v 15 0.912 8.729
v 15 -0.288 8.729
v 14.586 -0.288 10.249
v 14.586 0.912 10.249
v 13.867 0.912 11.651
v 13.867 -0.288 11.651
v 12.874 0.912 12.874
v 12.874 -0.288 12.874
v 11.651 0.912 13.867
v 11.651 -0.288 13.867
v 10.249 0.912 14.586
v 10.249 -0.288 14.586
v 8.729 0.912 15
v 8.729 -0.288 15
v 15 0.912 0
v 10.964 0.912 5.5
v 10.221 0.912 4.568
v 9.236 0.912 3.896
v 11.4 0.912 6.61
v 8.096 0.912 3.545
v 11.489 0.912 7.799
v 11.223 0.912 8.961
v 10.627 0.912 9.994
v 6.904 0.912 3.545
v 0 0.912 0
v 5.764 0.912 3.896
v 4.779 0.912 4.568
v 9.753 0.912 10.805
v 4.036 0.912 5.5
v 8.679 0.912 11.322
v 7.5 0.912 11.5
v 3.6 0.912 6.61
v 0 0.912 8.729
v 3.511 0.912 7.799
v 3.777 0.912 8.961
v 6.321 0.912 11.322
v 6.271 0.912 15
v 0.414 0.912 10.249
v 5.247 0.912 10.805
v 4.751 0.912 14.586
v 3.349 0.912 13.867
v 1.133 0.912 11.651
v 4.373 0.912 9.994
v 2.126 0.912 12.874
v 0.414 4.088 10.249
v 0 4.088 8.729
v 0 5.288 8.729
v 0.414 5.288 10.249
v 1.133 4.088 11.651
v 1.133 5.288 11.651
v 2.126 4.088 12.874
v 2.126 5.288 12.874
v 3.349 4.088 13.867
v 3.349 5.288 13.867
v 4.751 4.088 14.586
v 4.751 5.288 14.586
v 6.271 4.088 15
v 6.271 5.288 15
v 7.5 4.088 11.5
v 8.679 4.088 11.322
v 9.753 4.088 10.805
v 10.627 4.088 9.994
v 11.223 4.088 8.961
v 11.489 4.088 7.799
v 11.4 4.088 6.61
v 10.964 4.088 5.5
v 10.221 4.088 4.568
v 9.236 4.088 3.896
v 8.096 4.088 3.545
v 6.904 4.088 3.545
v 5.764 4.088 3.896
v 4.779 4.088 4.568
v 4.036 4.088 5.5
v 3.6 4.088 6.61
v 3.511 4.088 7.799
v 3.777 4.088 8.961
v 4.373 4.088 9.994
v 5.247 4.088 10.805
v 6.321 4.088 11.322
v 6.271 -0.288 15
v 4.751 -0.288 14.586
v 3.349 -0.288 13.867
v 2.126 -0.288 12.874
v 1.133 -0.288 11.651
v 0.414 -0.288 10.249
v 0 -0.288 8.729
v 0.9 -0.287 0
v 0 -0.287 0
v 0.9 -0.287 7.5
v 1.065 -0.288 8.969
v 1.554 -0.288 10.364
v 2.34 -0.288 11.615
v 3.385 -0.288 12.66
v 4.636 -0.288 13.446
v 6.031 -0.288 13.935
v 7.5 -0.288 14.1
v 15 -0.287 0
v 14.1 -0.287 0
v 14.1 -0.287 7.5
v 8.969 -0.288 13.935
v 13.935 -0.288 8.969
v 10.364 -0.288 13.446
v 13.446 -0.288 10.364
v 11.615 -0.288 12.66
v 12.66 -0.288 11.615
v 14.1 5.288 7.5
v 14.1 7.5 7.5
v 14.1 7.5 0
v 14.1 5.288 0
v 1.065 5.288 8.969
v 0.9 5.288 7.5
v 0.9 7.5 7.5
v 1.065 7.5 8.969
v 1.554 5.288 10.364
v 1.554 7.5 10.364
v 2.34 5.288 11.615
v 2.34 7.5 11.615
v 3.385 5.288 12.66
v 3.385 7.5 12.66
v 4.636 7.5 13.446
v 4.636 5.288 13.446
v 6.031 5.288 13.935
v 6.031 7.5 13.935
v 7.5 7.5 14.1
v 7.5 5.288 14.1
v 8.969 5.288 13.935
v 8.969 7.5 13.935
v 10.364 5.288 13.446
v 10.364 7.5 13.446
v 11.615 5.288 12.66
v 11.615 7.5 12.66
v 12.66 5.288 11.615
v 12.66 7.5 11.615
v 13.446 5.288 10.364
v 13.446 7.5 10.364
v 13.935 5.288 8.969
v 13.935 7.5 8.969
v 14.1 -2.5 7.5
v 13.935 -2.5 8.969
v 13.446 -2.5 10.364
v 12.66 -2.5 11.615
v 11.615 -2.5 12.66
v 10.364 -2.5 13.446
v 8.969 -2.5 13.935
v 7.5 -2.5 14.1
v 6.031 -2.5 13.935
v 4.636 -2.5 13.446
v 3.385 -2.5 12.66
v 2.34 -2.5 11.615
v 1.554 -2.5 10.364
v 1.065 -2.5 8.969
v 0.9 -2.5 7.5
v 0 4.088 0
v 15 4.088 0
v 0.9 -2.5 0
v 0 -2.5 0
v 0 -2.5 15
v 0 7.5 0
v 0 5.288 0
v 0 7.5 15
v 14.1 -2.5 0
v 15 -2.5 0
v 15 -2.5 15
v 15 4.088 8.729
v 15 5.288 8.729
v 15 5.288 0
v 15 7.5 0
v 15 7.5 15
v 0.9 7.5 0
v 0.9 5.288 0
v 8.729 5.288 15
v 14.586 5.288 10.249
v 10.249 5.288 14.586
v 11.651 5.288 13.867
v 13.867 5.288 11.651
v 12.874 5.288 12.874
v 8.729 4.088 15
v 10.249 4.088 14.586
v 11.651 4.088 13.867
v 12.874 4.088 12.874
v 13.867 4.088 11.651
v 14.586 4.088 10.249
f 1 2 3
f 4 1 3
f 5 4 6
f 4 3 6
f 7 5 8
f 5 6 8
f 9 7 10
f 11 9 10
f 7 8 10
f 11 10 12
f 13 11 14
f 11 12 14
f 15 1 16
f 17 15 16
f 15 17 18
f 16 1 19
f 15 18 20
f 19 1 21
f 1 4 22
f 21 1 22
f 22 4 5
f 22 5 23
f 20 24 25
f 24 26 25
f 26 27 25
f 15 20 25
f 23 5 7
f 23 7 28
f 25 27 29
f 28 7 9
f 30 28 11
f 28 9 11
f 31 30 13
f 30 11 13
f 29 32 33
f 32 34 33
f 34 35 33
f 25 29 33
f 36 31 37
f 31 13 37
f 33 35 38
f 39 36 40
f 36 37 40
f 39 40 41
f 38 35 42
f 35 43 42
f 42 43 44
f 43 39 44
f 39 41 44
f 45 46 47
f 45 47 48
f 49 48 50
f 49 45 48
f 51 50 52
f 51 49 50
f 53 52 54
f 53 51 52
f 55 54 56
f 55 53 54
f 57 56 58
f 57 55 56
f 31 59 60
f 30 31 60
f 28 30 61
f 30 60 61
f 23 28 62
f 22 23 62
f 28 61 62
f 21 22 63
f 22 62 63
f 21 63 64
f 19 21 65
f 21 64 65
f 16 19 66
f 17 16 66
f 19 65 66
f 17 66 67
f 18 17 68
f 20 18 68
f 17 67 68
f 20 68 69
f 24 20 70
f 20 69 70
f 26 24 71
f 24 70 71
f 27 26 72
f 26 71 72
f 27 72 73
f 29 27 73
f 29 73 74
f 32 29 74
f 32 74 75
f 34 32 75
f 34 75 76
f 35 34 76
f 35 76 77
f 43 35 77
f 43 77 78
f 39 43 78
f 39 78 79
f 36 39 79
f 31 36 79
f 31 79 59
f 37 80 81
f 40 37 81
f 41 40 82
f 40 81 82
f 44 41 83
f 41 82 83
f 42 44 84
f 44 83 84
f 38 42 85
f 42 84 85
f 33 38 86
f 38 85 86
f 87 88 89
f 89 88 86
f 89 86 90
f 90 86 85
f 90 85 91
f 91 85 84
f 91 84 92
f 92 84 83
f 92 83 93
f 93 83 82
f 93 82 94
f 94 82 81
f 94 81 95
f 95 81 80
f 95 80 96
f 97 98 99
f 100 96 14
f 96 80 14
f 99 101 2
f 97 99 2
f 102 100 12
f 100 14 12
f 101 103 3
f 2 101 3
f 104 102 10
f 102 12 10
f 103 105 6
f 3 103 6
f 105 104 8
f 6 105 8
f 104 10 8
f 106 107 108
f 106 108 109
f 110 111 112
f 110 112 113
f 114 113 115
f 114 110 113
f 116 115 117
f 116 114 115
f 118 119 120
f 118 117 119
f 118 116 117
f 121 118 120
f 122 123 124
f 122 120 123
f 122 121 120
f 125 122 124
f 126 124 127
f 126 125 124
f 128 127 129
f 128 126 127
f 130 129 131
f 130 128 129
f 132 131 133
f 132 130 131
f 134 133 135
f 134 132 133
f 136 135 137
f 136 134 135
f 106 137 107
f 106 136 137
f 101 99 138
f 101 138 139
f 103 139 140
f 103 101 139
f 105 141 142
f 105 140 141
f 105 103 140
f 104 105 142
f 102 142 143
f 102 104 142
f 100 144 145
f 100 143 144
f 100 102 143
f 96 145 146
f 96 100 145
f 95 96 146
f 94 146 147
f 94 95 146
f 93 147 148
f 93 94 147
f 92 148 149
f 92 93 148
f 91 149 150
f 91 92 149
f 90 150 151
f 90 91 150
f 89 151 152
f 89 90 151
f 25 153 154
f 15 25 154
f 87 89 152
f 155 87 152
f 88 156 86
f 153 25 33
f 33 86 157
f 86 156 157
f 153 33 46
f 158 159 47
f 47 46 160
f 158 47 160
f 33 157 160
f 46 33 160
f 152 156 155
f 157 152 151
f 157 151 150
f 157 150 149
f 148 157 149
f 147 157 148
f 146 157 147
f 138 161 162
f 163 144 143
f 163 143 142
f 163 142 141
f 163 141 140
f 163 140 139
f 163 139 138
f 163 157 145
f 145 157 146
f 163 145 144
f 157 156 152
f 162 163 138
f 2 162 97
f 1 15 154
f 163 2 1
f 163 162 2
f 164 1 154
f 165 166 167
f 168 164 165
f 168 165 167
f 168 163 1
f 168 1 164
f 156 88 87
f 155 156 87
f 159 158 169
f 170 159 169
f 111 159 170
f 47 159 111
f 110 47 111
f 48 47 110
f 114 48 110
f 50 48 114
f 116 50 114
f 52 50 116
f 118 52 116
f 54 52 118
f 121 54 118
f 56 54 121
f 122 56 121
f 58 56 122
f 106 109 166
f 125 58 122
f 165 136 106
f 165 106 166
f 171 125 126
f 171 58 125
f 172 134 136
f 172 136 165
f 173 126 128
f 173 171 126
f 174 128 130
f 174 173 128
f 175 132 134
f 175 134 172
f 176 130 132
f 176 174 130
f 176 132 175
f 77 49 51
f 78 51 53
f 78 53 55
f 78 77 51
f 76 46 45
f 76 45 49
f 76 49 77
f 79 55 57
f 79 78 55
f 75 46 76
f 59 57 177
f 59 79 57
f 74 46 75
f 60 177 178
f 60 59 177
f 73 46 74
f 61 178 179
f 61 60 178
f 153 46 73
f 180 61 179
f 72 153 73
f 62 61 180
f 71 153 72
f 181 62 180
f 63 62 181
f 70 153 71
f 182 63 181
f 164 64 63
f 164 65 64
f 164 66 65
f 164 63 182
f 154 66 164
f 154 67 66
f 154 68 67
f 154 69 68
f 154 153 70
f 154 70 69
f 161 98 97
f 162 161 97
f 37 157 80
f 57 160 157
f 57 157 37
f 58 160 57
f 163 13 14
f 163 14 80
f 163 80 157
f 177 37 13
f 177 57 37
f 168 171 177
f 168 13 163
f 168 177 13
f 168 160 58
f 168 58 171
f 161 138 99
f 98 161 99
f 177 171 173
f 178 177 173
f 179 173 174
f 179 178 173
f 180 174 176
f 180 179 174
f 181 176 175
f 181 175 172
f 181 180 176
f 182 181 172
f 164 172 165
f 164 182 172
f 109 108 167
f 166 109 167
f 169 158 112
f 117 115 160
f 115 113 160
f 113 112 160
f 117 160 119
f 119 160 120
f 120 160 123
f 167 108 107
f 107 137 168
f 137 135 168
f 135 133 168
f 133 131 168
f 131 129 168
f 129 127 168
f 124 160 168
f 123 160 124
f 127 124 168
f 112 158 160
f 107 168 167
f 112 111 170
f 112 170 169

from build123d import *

# Parameters (mm, degrees)
SKETCH1_W           = 15
SKETCH1_H           = 15
BOSS_EXTRUDE1_DEPTH = 5
SKETCH2_W           = 15
SKETCH2_H           = 2.5
BOSS_EXTRUDE2_DEPTH = 15
CUT_EXTRUDE1_START  = -7.5
CUT_EXTRUDE1_DEPTH  = 31
SKETCH4_R           = 7.6
CUT_EXTRUDE2_DEPTH  = 1.2
SKETCH5_R           = 6.6
CUT_EXTRUDE3_DEPTH  = 23.2125
CUT_EXTRUDE4_START  = 1.2
SKETCH6_R           = 7.6
CUT_EXTRUDE4_DEPTH  = 1.2
SKETCH7_R           = 6.6
CUT_EXTRUDE5_DEPTH  = 23.2125
SKETCH8_R           = 4
CUT_EXTRUDE6_DEPTH  = 23.2125


with BuildPart() as part:
    # Sketch1 → Boss-Extrude1 (new body)
    with BuildSketch(Plane(origin=(0, 0, 0), x_dir=(1, 0, 0), z_dir=(0, 1, 0))):
        with Locations((7.5, -7.5)):
            Rectangle(SKETCH1_W, SKETCH1_H)
    extrude(amount=BOSS_EXTRUDE1_DEPTH)

    # Sketch2 → Boss-Extrude2 (add)
    with BuildSketch(Plane.XY.offset(15)):
        with Locations((7.5, 6.25)):
            Rectangle(SKETCH2_W, SKETCH2_H)
        with Locations((7.5, -1.25)):
            Rectangle(SKETCH2_W, SKETCH2_H)
    extrude(amount=-BOSS_EXTRUDE2_DEPTH)

    # Sketch3 → Cut-Extrude1 (cut)
    with BuildSketch(Plane(origin=(0, 0, 0), x_dir=(-1, 0, 0), z_dir=(0, 0, -1)).offset(CUT_EXTRUDE1_START)):
        Polygon((-14.1, 7.5), (-14.1, 5.2875), (-15.1, 5.2875), (-15.1, 4.0875), (-7.5, 4.0875), (0.1, 4.0875), (0.1, 5.2875), (-0.9, 5.2875), (-0.9, 7.5), align=None)
    cut_extrude1 = extrude(amount=CUT_EXTRUDE1_DEPTH, mode=Mode.SUBTRACT)

    # Sketch4 → Cut-Extrude2 (cut)
    with BuildSketch(Plane(origin=(0, 4.0875, 0), x_dir=(1, 0, 0), z_dir=(0, 1, 0))):
        with Locations((7.5, -7.5)):
            Circle(SKETCH4_R)
    extrude(amount=CUT_EXTRUDE2_DEPTH, mode=Mode.SUBTRACT)

    # Sketch5 → Cut-Extrude3 (cut, through all)
    with BuildSketch(Plane(origin=(0, 4.0875, 0), x_dir=(1, 0, 0), z_dir=(0, 1, 0))):
        with Locations((7.5, -7.5)):
            Circle(SKETCH5_R)
    extrude(amount=CUT_EXTRUDE3_DEPTH, mode=Mode.SUBTRACT)

    # Mirror1: Cut-Extrude1 across plane
    add(cut_extrude1.mirror(Plane(origin=(0, 2.5, 0), x_dir=(0, 0, 1), z_dir=(0, -1, 0))), mode=Mode.SUBTRACT)

    # Sketch6 → Cut-Extrude4 (cut)
    with BuildSketch(Plane.XZ.offset(-0.9125).offset(CUT_EXTRUDE4_START)):
        with Locations((7.5, 7.5)):
            Circle(SKETCH6_R)
    extrude(amount=-CUT_EXTRUDE4_DEPTH, mode=Mode.SUBTRACT)

    # Sketch7 → Cut-Extrude5 (cut, through all)
    with BuildSketch(Plane.XZ.offset(-0.9125)):
        with Locations((7.5, 7.5)):
            Circle(SKETCH7_R)
    extrude(amount=CUT_EXTRUDE5_DEPTH, mode=Mode.SUBTRACT)

    # Sketch8 → Cut-Extrude6 (cut, through all)
    with BuildSketch(Plane(origin=(0, 4.0875, 0), x_dir=(1, 0, 0), z_dir=(0, 1, 0))):
        with Locations(Location((7.5, -7.5, 0), (0, 0, 270))):
            Circle(SKETCH8_R)
    extrude(amount=-CUT_EXTRUDE6_DEPTH, mode=Mode.SUBTRACT)


solid = part.part
